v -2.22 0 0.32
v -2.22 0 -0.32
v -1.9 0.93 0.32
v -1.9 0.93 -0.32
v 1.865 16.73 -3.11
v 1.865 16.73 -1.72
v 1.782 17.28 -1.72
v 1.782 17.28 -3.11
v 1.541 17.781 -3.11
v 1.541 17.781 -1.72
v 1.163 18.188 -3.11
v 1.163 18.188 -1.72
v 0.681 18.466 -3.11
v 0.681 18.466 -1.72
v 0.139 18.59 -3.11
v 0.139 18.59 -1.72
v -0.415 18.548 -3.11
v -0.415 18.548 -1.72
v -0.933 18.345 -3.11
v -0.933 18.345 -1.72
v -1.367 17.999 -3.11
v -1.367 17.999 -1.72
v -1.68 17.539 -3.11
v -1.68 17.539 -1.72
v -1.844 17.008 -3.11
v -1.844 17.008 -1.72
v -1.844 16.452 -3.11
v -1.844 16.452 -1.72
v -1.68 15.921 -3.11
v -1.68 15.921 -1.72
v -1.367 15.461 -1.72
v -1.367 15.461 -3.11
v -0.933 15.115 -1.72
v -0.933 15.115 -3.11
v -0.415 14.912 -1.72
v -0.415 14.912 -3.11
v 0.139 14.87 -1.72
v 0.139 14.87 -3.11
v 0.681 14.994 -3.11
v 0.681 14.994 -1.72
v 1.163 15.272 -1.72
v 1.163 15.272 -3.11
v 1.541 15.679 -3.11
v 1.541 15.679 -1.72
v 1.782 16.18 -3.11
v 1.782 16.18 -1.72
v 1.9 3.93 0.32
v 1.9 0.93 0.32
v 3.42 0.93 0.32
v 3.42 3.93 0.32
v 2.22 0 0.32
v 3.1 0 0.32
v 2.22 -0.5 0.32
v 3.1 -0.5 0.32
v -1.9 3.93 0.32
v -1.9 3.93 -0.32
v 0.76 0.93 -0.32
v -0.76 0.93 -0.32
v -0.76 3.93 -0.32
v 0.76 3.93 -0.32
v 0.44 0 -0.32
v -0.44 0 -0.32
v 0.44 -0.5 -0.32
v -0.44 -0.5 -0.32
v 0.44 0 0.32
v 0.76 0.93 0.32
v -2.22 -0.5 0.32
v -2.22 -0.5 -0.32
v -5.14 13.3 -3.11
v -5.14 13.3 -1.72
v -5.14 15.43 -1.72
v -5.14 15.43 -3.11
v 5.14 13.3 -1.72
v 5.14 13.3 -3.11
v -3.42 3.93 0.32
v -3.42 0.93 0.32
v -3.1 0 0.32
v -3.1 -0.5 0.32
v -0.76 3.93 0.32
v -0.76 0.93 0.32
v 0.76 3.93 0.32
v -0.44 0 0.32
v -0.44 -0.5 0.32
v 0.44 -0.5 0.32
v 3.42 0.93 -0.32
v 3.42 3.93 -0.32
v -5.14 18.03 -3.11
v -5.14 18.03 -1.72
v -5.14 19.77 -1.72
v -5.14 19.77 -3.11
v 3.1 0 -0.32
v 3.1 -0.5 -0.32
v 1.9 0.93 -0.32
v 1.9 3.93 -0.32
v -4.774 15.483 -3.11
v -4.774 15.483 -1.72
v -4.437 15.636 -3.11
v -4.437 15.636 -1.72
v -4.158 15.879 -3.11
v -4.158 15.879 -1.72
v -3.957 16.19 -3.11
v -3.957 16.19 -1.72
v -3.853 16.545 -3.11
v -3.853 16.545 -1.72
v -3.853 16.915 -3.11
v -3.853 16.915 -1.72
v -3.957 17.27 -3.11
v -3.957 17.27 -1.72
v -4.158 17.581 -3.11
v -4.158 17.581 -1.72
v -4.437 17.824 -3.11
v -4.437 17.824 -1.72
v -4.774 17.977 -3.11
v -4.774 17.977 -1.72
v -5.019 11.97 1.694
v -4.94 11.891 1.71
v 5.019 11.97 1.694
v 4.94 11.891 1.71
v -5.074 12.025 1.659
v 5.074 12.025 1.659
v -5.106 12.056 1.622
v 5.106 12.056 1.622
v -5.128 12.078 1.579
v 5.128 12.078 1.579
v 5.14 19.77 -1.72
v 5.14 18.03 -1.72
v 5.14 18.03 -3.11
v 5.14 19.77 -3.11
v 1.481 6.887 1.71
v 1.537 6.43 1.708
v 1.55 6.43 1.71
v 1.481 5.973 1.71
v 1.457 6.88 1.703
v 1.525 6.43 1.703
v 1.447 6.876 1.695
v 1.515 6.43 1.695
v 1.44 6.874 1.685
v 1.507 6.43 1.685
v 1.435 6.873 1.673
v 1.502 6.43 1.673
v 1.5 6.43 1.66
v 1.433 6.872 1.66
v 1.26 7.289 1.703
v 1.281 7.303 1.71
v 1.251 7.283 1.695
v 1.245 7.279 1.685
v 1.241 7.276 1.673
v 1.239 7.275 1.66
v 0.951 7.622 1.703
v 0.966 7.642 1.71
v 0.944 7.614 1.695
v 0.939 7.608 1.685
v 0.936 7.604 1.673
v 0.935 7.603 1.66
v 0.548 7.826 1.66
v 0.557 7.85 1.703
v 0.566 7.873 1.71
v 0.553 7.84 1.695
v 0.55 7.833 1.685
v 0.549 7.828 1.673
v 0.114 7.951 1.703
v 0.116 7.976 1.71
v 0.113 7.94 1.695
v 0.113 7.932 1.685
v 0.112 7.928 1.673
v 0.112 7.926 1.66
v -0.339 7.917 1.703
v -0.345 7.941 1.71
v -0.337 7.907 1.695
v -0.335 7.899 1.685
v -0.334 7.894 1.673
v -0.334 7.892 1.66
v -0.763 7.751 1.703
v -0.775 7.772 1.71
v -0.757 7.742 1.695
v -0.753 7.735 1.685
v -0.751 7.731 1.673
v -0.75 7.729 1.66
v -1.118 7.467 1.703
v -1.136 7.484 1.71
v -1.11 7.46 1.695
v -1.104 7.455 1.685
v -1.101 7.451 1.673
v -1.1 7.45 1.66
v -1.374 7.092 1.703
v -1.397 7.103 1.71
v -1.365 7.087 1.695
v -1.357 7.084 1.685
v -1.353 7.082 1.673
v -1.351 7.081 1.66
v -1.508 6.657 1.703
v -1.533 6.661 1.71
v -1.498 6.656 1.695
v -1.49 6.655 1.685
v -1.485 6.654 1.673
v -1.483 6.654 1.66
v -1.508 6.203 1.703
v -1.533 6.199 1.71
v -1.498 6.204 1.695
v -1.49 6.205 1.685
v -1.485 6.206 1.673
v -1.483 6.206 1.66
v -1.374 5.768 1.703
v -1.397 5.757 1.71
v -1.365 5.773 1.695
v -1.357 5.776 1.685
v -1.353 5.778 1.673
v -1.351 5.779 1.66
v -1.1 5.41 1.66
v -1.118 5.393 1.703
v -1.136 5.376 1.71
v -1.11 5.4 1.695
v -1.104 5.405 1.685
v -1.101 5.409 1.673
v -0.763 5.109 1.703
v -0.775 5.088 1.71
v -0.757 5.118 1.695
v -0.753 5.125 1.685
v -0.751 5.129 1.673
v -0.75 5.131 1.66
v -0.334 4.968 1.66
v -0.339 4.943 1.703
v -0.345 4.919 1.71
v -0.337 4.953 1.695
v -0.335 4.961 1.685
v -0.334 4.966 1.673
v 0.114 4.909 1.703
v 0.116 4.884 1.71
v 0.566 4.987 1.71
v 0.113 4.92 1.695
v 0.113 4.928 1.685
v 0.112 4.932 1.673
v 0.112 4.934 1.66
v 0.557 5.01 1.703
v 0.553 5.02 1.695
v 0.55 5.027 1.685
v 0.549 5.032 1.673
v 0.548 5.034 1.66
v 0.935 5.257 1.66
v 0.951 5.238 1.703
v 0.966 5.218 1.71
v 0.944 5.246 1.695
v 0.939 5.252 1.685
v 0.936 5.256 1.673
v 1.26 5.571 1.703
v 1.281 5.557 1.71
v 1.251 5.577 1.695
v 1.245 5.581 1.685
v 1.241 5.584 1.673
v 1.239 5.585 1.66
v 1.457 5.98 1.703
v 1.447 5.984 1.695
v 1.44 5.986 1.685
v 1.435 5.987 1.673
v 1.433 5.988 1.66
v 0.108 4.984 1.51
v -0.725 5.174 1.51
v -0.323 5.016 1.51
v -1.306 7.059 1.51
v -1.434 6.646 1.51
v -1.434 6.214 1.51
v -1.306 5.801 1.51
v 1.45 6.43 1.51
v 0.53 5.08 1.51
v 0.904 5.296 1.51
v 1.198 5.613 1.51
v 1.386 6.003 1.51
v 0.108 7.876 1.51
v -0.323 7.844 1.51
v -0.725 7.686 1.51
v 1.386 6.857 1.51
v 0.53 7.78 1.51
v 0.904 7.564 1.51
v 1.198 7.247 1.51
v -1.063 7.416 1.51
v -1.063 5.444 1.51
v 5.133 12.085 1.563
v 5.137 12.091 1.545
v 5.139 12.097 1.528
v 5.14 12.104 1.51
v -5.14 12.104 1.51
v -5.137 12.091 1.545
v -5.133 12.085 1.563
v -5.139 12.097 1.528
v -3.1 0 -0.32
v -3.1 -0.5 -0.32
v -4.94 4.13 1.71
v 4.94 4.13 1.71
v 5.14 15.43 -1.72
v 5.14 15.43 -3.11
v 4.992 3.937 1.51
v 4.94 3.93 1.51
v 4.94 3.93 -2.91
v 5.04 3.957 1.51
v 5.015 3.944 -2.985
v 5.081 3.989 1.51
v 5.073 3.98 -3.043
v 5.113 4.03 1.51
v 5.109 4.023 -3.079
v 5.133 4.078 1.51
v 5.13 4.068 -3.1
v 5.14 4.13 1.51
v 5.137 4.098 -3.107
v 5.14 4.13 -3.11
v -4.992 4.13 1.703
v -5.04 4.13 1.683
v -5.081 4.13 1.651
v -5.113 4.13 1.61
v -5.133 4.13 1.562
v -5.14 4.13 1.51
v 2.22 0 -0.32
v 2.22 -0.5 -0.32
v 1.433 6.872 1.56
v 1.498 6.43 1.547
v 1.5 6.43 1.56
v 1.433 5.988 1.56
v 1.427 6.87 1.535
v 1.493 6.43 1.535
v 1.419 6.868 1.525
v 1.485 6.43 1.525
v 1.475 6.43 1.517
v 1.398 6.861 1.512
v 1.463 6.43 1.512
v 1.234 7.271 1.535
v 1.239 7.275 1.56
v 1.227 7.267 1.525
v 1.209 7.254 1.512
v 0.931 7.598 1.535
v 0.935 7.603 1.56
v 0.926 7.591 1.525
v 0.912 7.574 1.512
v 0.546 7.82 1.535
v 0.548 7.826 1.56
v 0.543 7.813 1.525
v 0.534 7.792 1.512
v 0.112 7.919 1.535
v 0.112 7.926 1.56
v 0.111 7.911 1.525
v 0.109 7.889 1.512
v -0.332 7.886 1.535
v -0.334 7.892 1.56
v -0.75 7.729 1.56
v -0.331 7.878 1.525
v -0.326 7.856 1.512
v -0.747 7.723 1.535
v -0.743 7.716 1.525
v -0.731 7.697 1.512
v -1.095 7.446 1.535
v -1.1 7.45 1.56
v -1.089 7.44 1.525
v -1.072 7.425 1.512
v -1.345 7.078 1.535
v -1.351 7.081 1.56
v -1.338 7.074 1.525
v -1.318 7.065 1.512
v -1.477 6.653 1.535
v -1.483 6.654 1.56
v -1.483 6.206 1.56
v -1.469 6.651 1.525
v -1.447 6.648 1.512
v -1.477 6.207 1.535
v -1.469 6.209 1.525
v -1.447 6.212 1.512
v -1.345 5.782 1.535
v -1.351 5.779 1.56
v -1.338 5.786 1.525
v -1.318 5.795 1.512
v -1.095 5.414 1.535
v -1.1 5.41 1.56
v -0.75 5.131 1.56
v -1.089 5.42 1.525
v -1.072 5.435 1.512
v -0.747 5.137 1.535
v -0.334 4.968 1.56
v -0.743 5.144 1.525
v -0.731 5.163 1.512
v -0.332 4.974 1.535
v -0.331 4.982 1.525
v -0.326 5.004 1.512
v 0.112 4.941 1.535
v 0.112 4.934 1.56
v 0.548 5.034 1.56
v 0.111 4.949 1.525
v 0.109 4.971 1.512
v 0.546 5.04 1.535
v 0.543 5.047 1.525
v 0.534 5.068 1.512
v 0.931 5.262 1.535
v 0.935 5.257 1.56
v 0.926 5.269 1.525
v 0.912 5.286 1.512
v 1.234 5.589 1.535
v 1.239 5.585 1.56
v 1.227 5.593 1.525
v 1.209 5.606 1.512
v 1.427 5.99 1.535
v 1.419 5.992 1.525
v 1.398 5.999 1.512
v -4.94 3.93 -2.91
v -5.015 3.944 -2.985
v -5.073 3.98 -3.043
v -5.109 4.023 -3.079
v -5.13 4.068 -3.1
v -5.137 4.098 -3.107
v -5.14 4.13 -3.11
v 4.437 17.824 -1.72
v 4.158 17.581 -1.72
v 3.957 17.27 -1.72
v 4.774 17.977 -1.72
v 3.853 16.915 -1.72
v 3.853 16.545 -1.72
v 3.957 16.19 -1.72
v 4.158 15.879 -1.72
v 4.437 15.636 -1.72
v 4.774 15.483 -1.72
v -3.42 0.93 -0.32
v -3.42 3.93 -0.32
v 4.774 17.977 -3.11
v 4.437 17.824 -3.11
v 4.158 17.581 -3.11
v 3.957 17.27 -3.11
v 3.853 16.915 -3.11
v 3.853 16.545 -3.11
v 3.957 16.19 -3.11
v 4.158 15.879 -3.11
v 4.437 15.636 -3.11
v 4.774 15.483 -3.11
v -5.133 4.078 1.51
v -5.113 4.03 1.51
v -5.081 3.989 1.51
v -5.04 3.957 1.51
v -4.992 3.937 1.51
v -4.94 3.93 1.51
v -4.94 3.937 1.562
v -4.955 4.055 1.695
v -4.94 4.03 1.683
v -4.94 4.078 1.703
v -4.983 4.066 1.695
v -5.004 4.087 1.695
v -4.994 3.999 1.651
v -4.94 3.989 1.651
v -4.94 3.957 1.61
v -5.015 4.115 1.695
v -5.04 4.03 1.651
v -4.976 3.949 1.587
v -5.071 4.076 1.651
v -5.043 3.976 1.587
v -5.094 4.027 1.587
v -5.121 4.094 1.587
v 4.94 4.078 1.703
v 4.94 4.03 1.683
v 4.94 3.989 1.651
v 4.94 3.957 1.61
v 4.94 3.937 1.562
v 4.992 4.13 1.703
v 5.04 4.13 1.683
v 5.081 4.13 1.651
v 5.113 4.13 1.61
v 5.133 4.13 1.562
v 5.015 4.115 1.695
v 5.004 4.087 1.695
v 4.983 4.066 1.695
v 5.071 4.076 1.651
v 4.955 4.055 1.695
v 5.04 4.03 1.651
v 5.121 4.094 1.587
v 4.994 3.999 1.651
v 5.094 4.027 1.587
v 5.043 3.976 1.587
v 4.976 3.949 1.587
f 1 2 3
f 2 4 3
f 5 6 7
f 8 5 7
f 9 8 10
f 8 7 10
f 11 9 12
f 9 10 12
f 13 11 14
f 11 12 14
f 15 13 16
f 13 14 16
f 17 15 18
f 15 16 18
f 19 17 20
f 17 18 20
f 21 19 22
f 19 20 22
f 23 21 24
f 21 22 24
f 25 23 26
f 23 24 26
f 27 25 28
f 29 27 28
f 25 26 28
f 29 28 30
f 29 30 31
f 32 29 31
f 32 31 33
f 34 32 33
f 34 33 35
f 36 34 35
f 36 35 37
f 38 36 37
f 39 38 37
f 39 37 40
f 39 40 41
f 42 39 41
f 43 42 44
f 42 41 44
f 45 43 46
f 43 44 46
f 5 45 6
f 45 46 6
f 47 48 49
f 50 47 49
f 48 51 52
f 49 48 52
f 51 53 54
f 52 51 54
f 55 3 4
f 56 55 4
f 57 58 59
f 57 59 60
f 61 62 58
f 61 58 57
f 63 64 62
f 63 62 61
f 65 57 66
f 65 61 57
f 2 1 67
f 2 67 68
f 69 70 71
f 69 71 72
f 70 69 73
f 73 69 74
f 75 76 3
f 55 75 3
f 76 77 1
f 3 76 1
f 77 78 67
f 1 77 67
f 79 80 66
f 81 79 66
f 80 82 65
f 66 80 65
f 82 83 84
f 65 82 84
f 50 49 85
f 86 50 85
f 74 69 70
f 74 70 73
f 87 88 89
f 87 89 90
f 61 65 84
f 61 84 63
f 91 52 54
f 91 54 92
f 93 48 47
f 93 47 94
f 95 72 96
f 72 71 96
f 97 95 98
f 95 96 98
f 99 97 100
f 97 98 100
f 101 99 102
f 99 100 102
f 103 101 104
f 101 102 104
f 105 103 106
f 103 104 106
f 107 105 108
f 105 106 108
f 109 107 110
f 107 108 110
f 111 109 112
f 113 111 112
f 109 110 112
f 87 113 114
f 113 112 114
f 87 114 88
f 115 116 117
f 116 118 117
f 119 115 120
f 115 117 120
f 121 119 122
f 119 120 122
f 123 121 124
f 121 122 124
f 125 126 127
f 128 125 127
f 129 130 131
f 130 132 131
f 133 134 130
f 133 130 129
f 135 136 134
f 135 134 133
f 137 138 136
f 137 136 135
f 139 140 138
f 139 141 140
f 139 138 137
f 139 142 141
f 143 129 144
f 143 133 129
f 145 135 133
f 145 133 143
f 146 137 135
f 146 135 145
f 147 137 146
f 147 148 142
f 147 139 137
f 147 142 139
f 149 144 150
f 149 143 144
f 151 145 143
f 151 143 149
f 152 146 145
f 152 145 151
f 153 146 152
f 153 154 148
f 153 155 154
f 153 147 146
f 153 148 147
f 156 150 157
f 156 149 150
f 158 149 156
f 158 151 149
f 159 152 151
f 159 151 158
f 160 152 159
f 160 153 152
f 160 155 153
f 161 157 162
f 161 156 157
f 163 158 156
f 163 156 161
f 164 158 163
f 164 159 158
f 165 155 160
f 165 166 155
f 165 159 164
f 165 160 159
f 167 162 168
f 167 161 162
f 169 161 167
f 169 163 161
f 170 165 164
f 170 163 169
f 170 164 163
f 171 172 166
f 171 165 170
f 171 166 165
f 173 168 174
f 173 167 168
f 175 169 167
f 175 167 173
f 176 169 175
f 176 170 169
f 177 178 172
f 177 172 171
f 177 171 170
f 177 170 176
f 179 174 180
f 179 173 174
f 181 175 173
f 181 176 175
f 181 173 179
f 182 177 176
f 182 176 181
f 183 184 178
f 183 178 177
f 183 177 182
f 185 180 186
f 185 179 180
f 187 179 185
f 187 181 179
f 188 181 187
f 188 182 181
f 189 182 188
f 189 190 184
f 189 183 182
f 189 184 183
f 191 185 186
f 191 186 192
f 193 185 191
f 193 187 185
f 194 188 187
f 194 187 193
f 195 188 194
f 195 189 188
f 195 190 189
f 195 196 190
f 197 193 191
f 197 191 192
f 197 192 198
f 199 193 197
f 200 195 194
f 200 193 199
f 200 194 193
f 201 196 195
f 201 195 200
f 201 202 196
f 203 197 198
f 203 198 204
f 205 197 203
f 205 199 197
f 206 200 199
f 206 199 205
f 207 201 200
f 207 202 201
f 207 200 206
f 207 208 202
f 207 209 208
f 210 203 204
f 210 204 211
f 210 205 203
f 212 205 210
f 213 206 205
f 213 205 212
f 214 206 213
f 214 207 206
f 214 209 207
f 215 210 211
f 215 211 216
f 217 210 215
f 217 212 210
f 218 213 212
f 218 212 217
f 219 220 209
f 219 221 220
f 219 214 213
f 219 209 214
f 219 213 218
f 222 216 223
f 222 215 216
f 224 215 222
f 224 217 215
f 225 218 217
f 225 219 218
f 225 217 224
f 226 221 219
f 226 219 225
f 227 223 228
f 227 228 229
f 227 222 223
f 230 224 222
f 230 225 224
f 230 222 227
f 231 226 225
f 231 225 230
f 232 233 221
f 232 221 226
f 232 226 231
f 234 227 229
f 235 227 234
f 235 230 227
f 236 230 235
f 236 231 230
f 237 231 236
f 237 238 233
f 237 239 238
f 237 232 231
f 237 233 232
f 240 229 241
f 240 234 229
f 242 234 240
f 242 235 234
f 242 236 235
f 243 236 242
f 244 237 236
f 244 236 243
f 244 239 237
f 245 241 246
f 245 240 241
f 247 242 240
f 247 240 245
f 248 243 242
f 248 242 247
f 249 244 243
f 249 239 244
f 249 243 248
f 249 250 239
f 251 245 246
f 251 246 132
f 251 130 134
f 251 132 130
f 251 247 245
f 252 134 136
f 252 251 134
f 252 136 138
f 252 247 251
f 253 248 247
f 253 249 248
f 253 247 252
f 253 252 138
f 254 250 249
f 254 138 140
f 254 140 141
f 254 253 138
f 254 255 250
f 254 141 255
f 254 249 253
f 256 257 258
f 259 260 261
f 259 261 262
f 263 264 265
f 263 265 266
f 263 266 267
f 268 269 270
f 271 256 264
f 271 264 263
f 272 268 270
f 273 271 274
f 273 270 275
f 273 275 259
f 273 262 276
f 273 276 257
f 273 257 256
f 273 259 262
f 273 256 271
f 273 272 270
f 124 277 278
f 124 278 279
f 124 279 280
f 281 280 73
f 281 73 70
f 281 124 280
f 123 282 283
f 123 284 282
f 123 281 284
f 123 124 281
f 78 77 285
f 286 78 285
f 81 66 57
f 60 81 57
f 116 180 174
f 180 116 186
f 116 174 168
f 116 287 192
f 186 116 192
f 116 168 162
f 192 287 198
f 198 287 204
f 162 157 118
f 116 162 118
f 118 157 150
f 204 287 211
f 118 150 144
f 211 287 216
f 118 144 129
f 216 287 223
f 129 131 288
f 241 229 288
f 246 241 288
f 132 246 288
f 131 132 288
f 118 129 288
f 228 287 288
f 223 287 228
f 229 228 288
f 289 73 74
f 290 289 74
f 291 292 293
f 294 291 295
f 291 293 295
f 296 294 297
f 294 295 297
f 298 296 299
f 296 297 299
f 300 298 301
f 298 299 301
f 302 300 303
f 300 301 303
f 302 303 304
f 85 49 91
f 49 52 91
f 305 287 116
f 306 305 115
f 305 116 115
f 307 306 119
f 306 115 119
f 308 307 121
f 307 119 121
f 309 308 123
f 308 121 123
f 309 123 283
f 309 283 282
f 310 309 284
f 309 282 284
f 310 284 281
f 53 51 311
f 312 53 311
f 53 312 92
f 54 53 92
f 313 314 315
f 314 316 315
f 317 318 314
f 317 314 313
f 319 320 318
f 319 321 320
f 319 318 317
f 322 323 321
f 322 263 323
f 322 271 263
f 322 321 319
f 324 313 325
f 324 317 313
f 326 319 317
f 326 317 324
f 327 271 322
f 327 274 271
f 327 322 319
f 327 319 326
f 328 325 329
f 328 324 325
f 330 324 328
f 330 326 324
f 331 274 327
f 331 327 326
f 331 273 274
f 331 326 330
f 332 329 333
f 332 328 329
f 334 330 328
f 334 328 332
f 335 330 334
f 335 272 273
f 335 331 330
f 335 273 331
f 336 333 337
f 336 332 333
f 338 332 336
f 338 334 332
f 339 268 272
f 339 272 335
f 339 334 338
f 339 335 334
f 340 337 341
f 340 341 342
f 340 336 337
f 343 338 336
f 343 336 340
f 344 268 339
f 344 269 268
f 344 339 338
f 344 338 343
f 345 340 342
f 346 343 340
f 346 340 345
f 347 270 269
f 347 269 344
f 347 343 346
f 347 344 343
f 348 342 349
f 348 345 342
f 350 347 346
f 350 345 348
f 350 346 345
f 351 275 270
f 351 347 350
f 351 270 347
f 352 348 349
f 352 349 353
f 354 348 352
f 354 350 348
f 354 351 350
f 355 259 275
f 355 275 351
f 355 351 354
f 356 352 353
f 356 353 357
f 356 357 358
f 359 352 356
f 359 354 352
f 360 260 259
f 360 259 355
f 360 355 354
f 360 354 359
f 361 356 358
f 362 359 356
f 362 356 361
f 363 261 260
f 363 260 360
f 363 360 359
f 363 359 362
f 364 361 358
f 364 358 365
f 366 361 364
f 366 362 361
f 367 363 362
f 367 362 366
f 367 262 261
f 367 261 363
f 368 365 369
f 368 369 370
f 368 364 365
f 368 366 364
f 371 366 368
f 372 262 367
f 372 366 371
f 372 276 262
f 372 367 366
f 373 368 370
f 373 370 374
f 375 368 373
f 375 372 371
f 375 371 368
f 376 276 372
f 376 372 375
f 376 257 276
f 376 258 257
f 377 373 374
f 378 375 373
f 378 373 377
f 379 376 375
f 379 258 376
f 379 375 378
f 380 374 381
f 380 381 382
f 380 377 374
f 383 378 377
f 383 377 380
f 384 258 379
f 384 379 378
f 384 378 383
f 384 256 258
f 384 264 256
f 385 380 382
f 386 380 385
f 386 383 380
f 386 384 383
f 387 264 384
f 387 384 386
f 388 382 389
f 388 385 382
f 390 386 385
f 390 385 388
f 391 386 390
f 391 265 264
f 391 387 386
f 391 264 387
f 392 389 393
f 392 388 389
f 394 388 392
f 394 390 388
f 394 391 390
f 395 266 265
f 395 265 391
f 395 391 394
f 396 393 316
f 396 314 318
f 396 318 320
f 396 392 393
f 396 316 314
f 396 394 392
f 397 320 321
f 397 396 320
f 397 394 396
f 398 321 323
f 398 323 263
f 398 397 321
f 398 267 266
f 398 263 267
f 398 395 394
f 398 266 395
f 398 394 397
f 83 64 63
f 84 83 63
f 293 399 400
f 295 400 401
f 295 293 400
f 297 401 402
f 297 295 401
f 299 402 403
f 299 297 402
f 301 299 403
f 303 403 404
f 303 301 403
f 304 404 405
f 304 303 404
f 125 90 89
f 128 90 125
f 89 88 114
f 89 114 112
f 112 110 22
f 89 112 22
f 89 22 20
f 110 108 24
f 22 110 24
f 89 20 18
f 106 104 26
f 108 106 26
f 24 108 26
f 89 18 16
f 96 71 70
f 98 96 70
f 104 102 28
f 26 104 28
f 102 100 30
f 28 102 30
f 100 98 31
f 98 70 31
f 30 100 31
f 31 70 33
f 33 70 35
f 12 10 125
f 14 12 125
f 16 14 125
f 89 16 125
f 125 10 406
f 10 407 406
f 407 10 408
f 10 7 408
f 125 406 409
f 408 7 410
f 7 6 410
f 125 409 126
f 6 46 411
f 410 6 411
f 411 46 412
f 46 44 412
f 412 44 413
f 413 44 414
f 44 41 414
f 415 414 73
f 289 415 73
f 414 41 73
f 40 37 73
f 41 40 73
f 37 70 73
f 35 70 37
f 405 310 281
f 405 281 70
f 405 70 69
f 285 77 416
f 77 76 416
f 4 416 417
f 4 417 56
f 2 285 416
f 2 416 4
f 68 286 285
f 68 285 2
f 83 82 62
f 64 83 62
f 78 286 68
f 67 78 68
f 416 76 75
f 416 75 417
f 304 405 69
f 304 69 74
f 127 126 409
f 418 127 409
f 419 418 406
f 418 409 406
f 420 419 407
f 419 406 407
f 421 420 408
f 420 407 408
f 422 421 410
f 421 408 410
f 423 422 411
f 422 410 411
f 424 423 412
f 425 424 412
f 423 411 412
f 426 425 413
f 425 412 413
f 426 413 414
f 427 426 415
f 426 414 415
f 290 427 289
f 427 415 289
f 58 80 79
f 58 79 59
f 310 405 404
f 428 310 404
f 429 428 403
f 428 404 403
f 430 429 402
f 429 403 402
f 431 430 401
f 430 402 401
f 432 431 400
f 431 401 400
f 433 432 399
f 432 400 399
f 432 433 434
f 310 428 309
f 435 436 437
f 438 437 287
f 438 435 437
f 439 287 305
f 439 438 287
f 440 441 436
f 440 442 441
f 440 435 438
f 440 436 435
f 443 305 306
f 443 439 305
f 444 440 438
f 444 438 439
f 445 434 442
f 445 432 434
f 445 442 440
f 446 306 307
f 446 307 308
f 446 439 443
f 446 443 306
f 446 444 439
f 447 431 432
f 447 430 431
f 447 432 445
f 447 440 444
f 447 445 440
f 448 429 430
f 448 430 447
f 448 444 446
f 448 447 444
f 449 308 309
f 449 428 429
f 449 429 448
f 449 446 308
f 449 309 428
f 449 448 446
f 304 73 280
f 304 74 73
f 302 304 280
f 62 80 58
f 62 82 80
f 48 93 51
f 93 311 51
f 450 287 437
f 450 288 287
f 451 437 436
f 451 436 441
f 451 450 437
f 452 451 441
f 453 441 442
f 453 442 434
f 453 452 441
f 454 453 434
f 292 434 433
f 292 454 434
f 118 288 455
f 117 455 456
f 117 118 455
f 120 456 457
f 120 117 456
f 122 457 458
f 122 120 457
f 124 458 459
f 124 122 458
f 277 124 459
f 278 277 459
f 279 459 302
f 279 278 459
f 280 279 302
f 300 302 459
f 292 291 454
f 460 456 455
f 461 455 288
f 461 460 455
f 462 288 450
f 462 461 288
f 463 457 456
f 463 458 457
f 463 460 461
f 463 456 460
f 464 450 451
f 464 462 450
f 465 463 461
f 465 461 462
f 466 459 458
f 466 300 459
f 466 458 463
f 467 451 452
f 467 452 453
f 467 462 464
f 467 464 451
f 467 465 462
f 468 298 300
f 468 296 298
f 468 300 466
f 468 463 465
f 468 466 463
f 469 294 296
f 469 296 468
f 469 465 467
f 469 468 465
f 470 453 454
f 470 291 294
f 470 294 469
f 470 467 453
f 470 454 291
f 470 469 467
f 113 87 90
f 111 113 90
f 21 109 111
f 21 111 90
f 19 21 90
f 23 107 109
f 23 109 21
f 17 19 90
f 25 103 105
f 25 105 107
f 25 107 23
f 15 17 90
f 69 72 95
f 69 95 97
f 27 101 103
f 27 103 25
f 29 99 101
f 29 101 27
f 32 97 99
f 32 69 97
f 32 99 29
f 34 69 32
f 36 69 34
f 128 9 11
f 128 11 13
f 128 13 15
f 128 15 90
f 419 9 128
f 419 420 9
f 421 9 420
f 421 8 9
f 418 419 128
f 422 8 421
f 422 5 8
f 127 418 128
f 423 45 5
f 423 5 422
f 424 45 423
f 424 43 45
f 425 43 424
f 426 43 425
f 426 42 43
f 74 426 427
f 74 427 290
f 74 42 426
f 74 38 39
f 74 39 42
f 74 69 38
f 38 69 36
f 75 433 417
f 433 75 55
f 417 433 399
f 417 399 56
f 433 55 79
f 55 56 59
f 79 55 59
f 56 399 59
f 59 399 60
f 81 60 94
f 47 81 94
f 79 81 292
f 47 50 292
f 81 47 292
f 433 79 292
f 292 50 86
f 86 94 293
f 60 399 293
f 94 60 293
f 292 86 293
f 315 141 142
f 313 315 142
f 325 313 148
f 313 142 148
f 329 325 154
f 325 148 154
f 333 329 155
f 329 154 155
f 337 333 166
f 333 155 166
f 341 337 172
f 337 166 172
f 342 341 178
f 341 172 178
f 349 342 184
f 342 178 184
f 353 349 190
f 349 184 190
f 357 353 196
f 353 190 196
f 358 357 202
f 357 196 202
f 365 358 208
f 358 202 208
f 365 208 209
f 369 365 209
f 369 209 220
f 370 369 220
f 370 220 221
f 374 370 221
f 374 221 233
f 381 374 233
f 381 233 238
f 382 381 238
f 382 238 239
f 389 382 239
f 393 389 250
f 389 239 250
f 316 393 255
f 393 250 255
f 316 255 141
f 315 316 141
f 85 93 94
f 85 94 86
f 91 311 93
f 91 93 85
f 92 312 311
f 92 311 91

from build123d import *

# Parameters (mm, degrees)
SKETCH_1_W          = 0.88
SKETCH_1_H          = 0.64
EXTRUDE_1_DEPTH     = 0.5
EXTRUDE_1_2_DEPTH   = 0.5
EXTRUDE_1_3_DEPTH   = 0.5
SKETCH_2_7_W        = 1.52
SKETCH_2_7_H        = 0.64
EXTRUDE_2_DEPTH     = 3
SKETCH_4_W          = 10.28
SKETCH_4_H          = 4.82
EXTRUDE_3_DEPTH     = 8.1
SKETCH_5_2_W        = 10.28
SKETCH_5_2_H        = 1.39
EXTRUDE_4_DEPTH     = 6.47
SKETCH_8_R          = 1.865
CUT_EXTRUDE_1_DEPTH = 1.39
SKETCH_9_R          = 1.5
CUT_EXTRUDE_2_DEPTH = 0.2
FILLET_2_R          = 0.05
SKETCH_10_R         = 1.3
CUT_EXTRUDE_3_DEPTH = 1.39
FILLET_4_R          = 0.2


with BuildPart() as part:
    # Эскиз1 → Бобышка-Вытянуть1 (new body)
    with BuildSketch(Plane(origin=(0, 0, 0), x_dir=(1, 0, 0), z_dir=(0, 1, 0))):
        with Locations((2.66, 0)):
            Rectangle(SKETCH_1_W, SKETCH_1_H)
    extrude(amount=-EXTRUDE_1_DEPTH)

    # Эскиз2<6> → По сечениям3 section 0
    with BuildSketch(Plane(origin=(0, 0.93, 0), x_dir=(1, 0, 0), z_dir=(0, 1, 0))):
        with BuildLine():
            Line((1.9, 0.32), (1.9, -0.32))
            Line((1.9, -0.32), (3.42, -0.32))
            Line((3.42, -0.32), (3.42, 0.32))
            Line((3.42, 0.32), (1.9, 0.32))
        make_face()
    # Эскиз3<6> → По сечениям3 section 1
    with BuildSketch(Plane(origin=(0, 0, 0), x_dir=(1, 0, 0), z_dir=(0, 1, 0))):
        with BuildLine():
            Line((2.22, 0.32), (3.1, 0.32))
            Line((3.1, 0.32), (3.1, -0.32))
            Line((3.1, -0.32), (2.22, -0.32))
            Line((2.22, -0.32), (2.22, 0.32))
        make_face()
    loft()



with BuildPart() as body_2:
    # Эскиз1 → Extrude 1 2 (new body)
    with BuildSketch(Plane(origin=(0, 0, 0), x_dir=(1, 0, 0), z_dir=(0, 1, 0))):
        Rectangle(SKETCH_1_W, SKETCH_1_H)
    extrude(amount=-EXTRUDE_1_2_DEPTH)

    # Эскиз2<5> → По сечениям2 section 0
    with BuildSketch(Plane(origin=(0, 0.93, 0), x_dir=(1, 0, 0), z_dir=(0, 1, 0))):
        with BuildLine():
            Line((-0.76, 0.32), (0.76, 0.32))
            Line((0.76, 0.32), (0.76, -0.32))
            Line((0.76, -0.32), (-0.76, -0.32))
            Line((-0.76, -0.32), (-0.76, 0.32))
        make_face()
    # Эскиз3<5> → По сечениям2 section 1
    with BuildSketch(Plane(origin=(0, 0, 0), x_dir=(1, 0, 0), z_dir=(0, 1, 0))):
        with BuildLine():
            Line((-0.44, 0.32), (0.44, 0.32))
            Line((0.44, 0.32), (0.44, -0.32))
            Line((0.44, -0.32), (-0.44, -0.32))
            Line((-0.44, -0.32), (-0.44, 0.32))
        make_face()
    loft()


with BuildPart() as body_3:
    # Эскиз1 → Extrude 1 3 (new body)
    with BuildSketch(Plane(origin=(0, 0, 0), x_dir=(1, 0, 0), z_dir=(0, 1, 0))):
        with Locations((-2.66, 0)):
            Rectangle(SKETCH_1_W, SKETCH_1_H)
    extrude(amount=-EXTRUDE_1_3_DEPTH)

    # Эскиз3 → По сечениям1 section 0
    with BuildSketch(Plane(origin=(0, 0, 0), x_dir=(1, 0, 0), z_dir=(0, 1, 0))):
        with BuildLine():
            Line((-3.1, 0.32), (-2.22, 0.32))
            Line((-2.22, 0.32), (-2.22, -0.32))
            Line((-2.22, -0.32), (-3.1, -0.32))
            Line((-3.1, -0.32), (-3.1, 0.32))
        make_face()
    # Эскиз2 → По сечениям1 section 1
    with BuildSketch(Plane(origin=(0, 0.93, 0), x_dir=(1, 0, 0), z_dir=(0, 1, 0))):
        with BuildLine():
            Line((-3.42, 0.32), (-3.42, -0.32))
            Line((-3.42, -0.32), (-1.9, -0.32))
            Line((-1.9, -0.32), (-1.9, 0.32))
            Line((-1.9, 0.32), (-3.42, 0.32))
        make_face()
    loft()


with BuildPart() as part_1:
    add(part.part)

    add(body_2.part)  # Бобышка-Вытянуть2 merges body 2

    add(body_3.part)  # Бобышка-Вытянуть2 merges body 3
    # Эскиз2<7> → Бобышка-Вытянуть2 (add)
    with BuildSketch(Plane(origin=(0, 0.93, 0), x_dir=(1, 0, 0), z_dir=(0, 1, 0))):
        Rectangle(SKETCH_2_7_W, SKETCH_2_7_H)
        with Locations((2.66, 0)):
            Rectangle(SKETCH_2_7_W, SKETCH_2_7_H)
        with Locations((-2.66, 0)):
            Rectangle(SKETCH_2_7_W, SKETCH_2_7_H)
    extrude(amount=EXTRUDE_2_DEPTH)

    # Эскиз4 → Бобышка-Вытянуть3 (add)
    with BuildSketch(Plane(origin=(0, 3.93, 0), x_dir=(1, 0, 0), z_dir=(0, 1, 0))):
        with Locations((0, 0.7)):
            Rectangle(SKETCH_4_W, SKETCH_4_H)
    extrude(amount=EXTRUDE_3_DEPTH)

    # Эскиз5 → section 0 of loft_4
    with BuildSketch(Plane(origin=(0, 13.3, 0), x_dir=(1, 0, 0), z_dir=(0, 1, 0)), mode=Mode.PRIVATE) as loft_4_s0:
        with BuildLine():
            Line((-5.14, 3.11), (5.14, 3.11))
            Line((5.14, 3.11), (5.14, 1.72))
            Line((5.14, 1.72), (-5.14, 1.72))
            Line((-5.14, 1.72), (-5.14, 3.11))
        make_face()
    # loft up to a face of the part (loft_4)
    loft([loft_4_s0.sketch, part_1.faces().sort_by_distance((0, 12.03, -0.7))[0]])

    # Эскиз9 → Вырез-Вытянуть2 (cut)
    with BuildSketch(Plane.XY.offset(1.71)):
        with Locations((0, 6.43)):
            Circle(SKETCH_9_R)
    extrude(amount=-CUT_EXTRUDE_2_DEPTH, mode=Mode.SUBTRACT)

    # Скругление2
    fillet_2_edges = [part_1.edges().sort_by_distance(p)[0] for p in [
        (-1.5, 6.43, 1.51),
        (-1.5, 6.43, 1.71),
    ]]
    fillet(fillet_2_edges, radius=FILLET_2_R)

    # Скругление4
    fillet_4_edges = [part_1.edges().sort_by_distance(p)[0] for p in [
        (5.14, 3.93, -0.7),
        (5.14, 7.98, 1.71),
        (0, 3.93, -3.11),
        (-5.14, 3.93, -0.7),
        (0, 3.93, 1.71),
        (-5.14, 7.98, 1.71),
        (0, 12.03, 1.71),
    ]]
    fillet(fillet_4_edges, radius=FILLET_4_R)


with BuildPart() as body_2_2:
    # Эскиз5<2> → Бобышка-Вытянуть4 (new body)
    with BuildSketch(Plane(origin=(0, 13.3, 0), x_dir=(1, 0, 0), z_dir=(0, 1, 0))):
        with Locations((0, 2.415)):
            Rectangle(SKETCH_5_2_W, SKETCH_5_2_H)
    extrude(amount=EXTRUDE_4_DEPTH)

    # Эскиз8 → Вырез-Вытянуть1 (cut)
    with BuildSketch(Plane.XY.offset(-1.72)):
        with Locations((0, 16.73)):
            Circle(SKETCH_8_R)
    extrude(amount=-CUT_EXTRUDE_1_DEPTH, mode=Mode.SUBTRACT)

    # Эскиз10 → Вырез-Вытянуть3 (cut)
    with BuildSketch(Plane.XY.offset(-1.72)):
        with Locations((5.14, 16.73)):
            Circle(SKETCH_10_R)
        with Locations((-5.14, 16.73)):
            Circle(SKETCH_10_R)
    extrude(amount=-CUT_EXTRUDE_3_DEPTH, mode=Mode.SUBTRACT)


solid = Compound([part_1.part, body_2_2.part])
